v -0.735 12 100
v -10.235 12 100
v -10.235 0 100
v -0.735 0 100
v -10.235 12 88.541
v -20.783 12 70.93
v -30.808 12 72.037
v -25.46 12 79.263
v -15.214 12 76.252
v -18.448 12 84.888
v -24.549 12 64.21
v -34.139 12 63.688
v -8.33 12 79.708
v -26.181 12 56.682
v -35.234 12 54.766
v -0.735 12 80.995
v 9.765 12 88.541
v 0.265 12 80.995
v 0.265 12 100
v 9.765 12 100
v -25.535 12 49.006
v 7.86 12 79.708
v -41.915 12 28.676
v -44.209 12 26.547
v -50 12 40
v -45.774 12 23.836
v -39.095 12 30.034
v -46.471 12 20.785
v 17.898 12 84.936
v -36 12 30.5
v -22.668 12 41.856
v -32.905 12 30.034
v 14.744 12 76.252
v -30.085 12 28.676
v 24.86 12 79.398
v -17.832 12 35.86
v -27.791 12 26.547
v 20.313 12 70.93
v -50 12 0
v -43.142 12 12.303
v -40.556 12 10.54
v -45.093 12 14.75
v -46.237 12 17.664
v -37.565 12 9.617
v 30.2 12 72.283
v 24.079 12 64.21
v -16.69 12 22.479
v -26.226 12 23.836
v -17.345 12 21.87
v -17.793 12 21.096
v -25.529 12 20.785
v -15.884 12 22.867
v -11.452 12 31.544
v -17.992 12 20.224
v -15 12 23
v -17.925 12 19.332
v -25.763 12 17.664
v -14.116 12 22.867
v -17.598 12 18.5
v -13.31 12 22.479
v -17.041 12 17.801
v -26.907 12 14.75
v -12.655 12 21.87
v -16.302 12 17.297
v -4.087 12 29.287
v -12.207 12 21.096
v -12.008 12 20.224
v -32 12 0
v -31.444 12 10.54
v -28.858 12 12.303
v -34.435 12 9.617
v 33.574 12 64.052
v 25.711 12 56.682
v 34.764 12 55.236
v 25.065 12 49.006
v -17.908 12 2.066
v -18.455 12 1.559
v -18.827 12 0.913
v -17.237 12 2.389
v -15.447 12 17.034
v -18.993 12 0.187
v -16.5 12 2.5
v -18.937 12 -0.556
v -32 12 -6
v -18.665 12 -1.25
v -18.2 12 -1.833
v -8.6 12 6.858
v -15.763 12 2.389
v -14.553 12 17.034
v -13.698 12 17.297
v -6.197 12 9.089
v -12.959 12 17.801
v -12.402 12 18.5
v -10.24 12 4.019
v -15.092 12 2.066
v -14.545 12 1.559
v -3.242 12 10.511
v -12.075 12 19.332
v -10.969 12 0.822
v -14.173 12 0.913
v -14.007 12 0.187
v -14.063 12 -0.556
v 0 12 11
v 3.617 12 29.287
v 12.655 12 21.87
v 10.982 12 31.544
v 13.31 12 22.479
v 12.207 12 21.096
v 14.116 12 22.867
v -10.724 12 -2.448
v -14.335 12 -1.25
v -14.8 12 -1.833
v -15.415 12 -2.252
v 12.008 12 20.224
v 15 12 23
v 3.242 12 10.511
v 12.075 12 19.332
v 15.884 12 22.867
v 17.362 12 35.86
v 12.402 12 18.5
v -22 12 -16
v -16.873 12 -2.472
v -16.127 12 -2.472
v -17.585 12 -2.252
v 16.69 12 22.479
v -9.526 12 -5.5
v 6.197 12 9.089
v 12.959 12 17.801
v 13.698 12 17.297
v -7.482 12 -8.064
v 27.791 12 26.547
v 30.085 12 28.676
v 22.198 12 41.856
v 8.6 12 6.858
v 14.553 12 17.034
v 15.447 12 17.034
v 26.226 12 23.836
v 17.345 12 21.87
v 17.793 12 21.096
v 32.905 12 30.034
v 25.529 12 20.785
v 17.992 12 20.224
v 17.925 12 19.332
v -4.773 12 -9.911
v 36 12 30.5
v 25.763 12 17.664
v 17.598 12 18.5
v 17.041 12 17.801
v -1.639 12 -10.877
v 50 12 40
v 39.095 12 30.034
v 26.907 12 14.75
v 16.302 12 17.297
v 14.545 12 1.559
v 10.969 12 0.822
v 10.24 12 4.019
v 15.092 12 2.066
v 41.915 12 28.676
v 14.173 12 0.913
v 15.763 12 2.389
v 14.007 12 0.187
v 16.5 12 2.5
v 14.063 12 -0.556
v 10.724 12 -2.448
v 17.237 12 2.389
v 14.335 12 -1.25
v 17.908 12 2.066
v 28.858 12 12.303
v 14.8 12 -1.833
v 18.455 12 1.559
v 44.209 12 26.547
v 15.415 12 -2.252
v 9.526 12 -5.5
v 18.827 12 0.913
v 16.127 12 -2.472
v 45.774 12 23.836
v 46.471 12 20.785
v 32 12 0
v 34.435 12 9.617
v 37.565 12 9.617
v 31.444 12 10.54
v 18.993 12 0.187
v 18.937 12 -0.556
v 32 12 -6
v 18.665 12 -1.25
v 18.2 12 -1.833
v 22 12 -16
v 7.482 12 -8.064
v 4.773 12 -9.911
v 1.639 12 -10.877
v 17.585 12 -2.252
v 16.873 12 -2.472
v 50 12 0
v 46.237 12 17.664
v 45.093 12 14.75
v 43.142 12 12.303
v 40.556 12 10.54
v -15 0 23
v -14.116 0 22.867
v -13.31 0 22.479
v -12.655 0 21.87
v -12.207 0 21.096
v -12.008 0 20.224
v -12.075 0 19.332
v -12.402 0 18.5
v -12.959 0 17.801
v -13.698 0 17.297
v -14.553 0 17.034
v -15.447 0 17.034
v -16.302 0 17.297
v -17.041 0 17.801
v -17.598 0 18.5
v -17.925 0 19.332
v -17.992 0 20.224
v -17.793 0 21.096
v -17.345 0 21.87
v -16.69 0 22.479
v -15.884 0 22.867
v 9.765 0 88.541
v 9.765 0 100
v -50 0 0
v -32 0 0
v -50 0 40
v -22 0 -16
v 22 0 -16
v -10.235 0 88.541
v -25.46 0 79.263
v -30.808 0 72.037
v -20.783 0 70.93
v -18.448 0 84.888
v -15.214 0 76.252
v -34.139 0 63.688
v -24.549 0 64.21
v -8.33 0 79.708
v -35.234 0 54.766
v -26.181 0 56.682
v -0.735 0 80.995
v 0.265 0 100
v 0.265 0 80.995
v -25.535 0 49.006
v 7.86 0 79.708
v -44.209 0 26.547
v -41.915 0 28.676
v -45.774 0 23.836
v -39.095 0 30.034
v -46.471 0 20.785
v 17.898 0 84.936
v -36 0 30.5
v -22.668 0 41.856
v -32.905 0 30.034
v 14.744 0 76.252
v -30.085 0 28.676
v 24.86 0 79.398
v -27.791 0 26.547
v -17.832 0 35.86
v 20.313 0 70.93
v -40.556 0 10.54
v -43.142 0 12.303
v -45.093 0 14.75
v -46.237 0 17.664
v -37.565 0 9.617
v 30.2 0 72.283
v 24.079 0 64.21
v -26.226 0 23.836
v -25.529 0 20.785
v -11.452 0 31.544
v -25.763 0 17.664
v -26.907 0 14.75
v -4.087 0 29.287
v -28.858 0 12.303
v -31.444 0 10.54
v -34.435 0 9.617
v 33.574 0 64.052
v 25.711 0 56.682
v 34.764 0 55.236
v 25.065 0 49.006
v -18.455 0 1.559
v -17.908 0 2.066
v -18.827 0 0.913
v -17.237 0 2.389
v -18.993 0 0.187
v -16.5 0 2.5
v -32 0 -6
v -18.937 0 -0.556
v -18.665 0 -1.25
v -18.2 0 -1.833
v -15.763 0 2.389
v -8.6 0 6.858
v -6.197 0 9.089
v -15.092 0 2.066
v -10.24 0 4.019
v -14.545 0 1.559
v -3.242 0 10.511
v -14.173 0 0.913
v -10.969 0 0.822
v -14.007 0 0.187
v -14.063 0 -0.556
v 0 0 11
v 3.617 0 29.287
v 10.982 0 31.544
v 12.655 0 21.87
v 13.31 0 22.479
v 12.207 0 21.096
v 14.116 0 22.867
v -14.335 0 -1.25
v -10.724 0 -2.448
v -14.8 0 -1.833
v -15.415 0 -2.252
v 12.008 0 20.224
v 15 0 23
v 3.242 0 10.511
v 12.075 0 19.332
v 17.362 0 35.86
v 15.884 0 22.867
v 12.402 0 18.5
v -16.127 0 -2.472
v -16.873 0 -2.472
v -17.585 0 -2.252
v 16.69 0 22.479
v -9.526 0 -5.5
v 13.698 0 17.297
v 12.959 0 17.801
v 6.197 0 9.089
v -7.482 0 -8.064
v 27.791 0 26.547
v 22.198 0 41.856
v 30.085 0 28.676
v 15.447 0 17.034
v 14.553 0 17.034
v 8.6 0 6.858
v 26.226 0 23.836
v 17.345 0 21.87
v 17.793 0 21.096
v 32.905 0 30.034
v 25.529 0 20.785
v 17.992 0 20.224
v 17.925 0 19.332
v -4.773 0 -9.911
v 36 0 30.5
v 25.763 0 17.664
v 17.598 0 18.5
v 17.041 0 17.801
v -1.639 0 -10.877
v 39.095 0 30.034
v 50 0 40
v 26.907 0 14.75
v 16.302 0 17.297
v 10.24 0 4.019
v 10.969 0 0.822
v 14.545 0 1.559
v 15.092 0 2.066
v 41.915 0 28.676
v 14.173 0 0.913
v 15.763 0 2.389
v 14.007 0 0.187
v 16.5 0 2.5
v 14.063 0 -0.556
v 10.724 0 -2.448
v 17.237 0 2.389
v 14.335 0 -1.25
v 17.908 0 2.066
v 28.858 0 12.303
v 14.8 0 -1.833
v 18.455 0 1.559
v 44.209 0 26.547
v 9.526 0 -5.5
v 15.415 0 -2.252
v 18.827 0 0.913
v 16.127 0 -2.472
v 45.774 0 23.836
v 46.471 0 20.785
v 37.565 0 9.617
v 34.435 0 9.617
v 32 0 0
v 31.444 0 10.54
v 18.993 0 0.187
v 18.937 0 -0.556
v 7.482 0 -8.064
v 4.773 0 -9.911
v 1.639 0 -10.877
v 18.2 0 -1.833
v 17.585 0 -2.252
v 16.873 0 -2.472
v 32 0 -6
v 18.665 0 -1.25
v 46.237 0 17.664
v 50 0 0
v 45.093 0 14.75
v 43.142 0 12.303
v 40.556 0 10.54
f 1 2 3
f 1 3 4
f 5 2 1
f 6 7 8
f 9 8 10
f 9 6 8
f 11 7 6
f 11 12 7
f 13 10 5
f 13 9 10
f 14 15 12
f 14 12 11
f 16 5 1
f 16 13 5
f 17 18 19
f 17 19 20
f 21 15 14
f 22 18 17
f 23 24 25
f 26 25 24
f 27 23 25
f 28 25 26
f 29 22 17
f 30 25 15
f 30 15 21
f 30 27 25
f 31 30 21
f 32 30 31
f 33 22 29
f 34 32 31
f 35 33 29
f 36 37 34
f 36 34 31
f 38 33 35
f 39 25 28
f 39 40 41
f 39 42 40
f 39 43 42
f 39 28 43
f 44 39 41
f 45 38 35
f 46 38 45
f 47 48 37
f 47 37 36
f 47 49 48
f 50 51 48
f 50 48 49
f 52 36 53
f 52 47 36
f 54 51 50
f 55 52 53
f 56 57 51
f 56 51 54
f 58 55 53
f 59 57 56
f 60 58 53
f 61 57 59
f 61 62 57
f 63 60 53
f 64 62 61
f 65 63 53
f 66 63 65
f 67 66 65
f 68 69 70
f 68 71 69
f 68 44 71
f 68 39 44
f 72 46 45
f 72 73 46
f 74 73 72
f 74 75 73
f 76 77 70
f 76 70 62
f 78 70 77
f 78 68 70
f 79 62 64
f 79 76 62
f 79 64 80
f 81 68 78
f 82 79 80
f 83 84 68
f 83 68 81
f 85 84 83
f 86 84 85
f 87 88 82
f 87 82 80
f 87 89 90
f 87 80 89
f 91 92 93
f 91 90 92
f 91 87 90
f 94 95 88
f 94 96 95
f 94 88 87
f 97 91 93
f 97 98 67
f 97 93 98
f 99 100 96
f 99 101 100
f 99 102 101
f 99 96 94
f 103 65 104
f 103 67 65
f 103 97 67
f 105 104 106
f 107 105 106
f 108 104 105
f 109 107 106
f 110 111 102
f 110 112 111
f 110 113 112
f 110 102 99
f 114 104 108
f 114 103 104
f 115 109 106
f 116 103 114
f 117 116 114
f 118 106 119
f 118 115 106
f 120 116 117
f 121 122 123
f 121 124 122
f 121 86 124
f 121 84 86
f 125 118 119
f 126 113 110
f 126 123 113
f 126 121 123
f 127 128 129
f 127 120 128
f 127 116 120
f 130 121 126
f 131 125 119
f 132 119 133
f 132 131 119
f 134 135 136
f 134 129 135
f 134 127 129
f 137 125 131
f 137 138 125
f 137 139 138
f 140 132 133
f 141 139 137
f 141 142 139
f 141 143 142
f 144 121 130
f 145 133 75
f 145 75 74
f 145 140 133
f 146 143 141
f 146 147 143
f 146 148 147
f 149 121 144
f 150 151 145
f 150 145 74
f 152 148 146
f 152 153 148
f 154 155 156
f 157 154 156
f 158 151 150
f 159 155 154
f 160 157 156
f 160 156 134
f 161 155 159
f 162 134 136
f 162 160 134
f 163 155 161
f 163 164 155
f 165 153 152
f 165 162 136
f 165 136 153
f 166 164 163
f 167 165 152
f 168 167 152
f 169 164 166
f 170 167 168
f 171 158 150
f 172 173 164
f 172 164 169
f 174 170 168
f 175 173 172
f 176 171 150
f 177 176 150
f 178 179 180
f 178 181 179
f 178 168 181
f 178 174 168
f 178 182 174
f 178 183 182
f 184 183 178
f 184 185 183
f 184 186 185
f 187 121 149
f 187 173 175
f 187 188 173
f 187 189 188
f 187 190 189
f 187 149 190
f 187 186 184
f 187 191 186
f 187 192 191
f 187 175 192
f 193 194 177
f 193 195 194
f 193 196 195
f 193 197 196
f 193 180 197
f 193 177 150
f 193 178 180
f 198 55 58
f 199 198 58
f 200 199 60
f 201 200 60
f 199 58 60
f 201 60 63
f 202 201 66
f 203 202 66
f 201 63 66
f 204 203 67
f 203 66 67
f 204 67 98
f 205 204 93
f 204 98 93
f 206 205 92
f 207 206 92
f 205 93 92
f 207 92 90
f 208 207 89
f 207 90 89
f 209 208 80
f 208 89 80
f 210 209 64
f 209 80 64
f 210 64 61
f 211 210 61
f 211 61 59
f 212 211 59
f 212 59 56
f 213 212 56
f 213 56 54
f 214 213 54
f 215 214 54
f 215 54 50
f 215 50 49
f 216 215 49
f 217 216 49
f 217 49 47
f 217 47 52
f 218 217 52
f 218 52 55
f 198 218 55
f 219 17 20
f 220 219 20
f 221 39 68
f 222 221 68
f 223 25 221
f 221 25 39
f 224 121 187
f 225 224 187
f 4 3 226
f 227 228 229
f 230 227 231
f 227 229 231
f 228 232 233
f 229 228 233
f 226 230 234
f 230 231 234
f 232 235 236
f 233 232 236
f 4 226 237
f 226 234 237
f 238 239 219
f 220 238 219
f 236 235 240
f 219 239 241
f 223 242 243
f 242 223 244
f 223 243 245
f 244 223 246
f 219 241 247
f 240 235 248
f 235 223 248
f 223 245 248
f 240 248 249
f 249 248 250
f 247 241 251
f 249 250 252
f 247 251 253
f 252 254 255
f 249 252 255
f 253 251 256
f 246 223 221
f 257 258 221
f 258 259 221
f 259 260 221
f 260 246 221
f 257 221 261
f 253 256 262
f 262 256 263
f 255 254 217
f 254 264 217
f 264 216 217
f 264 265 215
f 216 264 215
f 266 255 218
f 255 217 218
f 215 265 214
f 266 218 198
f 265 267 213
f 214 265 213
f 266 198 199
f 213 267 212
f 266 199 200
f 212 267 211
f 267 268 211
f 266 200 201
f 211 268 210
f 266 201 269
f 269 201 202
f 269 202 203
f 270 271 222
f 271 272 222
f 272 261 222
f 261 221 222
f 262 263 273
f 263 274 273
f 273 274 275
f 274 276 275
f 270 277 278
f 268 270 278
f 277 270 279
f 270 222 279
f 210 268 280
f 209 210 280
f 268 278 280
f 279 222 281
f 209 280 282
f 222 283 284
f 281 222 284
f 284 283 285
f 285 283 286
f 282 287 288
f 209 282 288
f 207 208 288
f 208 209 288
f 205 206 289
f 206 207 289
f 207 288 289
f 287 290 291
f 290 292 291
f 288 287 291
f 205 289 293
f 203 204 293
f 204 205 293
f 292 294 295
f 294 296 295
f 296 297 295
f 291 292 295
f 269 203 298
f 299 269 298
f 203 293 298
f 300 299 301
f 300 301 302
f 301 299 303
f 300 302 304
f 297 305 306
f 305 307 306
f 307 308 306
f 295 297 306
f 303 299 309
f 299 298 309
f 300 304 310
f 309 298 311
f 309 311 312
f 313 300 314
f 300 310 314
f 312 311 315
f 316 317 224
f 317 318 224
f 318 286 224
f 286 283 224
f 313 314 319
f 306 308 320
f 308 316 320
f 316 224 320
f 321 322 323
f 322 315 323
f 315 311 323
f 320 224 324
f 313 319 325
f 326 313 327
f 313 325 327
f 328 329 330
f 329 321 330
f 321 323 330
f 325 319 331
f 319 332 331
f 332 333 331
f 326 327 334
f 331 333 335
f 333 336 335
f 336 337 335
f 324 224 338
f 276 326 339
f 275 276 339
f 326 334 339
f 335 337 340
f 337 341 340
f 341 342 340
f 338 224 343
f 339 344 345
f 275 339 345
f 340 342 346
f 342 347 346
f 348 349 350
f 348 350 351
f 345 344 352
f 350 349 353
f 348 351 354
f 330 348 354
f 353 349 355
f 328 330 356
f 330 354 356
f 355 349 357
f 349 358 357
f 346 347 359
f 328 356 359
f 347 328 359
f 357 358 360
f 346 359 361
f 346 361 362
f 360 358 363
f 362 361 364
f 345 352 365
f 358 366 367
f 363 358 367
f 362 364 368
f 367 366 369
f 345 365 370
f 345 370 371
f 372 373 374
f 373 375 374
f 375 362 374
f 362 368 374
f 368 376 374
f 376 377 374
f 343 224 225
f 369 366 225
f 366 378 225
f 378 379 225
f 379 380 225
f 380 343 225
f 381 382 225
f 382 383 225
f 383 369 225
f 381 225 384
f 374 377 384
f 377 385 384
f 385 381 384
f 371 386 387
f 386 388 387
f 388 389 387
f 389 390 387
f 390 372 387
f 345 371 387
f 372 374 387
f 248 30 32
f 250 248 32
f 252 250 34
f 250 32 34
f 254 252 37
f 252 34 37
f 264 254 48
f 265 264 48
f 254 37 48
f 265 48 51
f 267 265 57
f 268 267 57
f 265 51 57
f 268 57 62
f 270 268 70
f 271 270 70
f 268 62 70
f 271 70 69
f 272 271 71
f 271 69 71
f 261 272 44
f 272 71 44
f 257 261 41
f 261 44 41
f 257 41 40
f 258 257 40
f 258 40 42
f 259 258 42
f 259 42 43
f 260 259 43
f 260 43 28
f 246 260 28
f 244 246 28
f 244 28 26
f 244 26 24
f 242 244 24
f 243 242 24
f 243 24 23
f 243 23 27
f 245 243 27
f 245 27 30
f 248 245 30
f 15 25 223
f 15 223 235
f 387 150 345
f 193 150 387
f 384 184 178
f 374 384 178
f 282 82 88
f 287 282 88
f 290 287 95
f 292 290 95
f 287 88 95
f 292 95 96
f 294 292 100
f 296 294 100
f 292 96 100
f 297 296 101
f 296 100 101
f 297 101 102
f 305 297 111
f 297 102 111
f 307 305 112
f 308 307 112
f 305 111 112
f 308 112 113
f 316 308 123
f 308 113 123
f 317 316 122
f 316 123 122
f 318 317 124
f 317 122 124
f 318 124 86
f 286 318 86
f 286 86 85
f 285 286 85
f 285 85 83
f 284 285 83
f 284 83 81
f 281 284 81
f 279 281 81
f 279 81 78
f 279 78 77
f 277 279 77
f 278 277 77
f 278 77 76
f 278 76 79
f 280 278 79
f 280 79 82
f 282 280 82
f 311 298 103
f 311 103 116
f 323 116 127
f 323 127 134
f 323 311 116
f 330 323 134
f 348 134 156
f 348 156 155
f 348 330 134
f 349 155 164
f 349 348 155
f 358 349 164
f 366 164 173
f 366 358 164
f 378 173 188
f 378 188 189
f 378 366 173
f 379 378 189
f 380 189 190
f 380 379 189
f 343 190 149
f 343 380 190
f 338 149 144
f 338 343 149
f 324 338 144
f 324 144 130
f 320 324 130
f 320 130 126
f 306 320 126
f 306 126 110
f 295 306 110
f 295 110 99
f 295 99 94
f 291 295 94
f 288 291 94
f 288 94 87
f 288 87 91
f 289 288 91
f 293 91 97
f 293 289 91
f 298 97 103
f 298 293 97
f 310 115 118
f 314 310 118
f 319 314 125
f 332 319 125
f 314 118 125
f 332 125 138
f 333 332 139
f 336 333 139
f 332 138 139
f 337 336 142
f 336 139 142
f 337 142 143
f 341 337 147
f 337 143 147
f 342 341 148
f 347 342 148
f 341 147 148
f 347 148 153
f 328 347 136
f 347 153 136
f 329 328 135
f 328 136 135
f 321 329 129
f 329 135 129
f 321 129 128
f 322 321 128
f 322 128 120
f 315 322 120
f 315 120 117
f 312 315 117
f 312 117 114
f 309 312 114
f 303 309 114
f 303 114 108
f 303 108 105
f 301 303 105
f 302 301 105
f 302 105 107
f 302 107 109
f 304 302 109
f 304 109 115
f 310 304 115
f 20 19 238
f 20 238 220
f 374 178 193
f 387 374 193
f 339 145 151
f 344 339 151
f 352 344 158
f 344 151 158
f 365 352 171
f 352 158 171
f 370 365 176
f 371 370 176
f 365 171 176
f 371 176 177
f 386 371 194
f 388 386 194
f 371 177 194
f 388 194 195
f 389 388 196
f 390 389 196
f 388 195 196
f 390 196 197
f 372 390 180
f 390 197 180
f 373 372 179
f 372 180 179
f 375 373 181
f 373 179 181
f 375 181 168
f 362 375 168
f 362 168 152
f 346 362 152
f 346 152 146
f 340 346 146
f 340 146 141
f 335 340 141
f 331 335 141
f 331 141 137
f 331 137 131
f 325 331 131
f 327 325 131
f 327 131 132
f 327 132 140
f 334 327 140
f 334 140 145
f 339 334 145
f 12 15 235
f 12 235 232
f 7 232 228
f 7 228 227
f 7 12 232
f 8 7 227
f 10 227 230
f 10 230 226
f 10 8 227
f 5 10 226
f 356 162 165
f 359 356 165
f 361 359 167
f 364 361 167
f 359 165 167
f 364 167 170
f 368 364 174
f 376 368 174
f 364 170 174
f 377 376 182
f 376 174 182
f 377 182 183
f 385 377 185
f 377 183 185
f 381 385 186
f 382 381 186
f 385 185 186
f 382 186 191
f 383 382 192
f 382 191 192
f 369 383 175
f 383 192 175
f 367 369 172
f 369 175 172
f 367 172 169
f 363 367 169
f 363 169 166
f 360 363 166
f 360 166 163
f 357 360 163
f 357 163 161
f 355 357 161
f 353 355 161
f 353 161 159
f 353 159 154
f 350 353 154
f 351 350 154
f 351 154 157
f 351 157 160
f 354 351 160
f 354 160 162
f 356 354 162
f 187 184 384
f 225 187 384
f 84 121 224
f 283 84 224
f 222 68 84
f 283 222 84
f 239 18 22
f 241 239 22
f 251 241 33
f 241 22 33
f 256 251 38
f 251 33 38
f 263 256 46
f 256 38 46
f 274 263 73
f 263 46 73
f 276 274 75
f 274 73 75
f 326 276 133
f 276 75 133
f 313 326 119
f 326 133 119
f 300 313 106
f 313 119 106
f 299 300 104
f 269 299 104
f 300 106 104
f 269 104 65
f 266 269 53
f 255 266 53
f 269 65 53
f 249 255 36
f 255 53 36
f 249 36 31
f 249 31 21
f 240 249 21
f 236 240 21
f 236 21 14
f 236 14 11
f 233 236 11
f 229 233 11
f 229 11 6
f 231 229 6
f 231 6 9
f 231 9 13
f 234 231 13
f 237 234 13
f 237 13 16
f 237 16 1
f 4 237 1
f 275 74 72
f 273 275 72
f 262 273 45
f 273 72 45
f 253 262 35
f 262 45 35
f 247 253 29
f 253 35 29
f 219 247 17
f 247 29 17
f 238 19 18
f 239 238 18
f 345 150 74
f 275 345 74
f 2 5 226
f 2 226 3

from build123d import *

# Parameters (mm, degrees)
SKETCH1_W           = 100
SKETCH1_H           = 100
SKETCH1_R           = 11
BOSS_EXTRUDE1_DEPTH = 12
SKETCH9_W           = 100
SKETCH9_H           = 50
BOSS_EXTRUDE3_DEPTH = 12
CUT_EXTRUDE3_REACH  = 114.446
SKETCH4_R           = 10.5
CUT_EXTRUDE4_REACH  = 114.446
CUT_EXTRUDE5_REACH  = 114.446
SKETCH6_R           = 26
CUT_EXTRUDE6_REACH  = 114.446
CUT_EXTRUDE7_REACH  = 114.446
SKETCH11_R          = 2.5
CHAMFER1_SIZE       = 10
CUT_EXTRUDE8_REACH  = 114.446
SKETCH12_R          = 3


with BuildPart() as part:
    # Sketch1 → Boss-Extrude1 (new body)
    with BuildSketch(Plane(origin=(0, 0, 0), x_dir=(1, 0, 0), z_dir=(0, 1, 0))):
        Rectangle(SKETCH1_W, SKETCH1_H)
        with Locations(Location((0, 0, 0), (0, 0, 270))):
            Circle(SKETCH1_R, mode=Mode.SUBTRACT)
    extrude(amount=BOSS_EXTRUDE1_DEPTH)

    # Sketch9 → Boss-Extrude3 (add)
    with BuildSketch(Plane(origin=(0, 12, 0), x_dir=(1, 0, 0), z_dir=(0, 1, 0))):
        with Locations((0, -75)):
            Rectangle(SKETCH9_W, SKETCH9_H)
    extrude(amount=-BOSS_EXTRUDE3_DEPTH)

    # Sketch4 → Cut-Extrude3 (cut, up to next)
    with BuildSketch(Plane(origin=(0, 12, 0), x_dir=(1, 0, 0), z_dir=(0, 1, 0)), mode=Mode.PRIVATE) as cut_extrude3_sk1:
        with Locations(Location((-36, -20, 0), (0, 0, 270))):
            Circle(SKETCH4_R)
    cut_extrude3_tool1 = extrude(cut_extrude3_sk1.sketch, amount=-CUT_EXTRUDE3_REACH, mode=Mode.PRIVATE) & part.part
    # Sketch4 → Cut-Extrude3 (cut, up to next)
    with BuildSketch(Plane(origin=(0, 12, 0), x_dir=(1, 0, 0), z_dir=(0, 1, 0)), mode=Mode.PRIVATE) as cut_extrude3_sk2:
        with Locations(Location((36, -20, 0), (0, 0, 270))):
            Circle(SKETCH4_R)
    cut_extrude3_tool2 = extrude(cut_extrude3_sk2.sketch, amount=-CUT_EXTRUDE3_REACH, mode=Mode.PRIVATE) & part.part
    add(cut_extrude3_tool1.solids().sort_by_distance((-36, 12, 20))[0], mode=Mode.SUBTRACT)
    add(cut_extrude3_tool2.solids().sort_by_distance((36, 12, 20))[0], mode=Mode.SUBTRACT)

    # Sketch5 → Cut-Extrude4 (cut, up to next)
    with BuildSketch(Plane(origin=(0, 12, 0), x_dir=(1, 0, 0), z_dir=(0, 1, 0)), mode=Mode.PRIVATE) as cut_extrude4_sk1:
        Polygon((-50, 0), (-32, 0), (-32, 16), (32, 16), (32, 0), (50, 0), (50, 50), (-50, 50), align=None)
    cut_extrude4_tool1 = extrude(cut_extrude4_sk1.sketch, amount=-CUT_EXTRUDE4_REACH, mode=Mode.PRIVATE) & part.part
    add(cut_extrude4_tool1.solids().sort_by_distance((0, 12, -29.37827))[0], mode=Mode.SUBTRACT)

    # Sketch6 → Cut-Extrude5 (cut, up to next)
    with BuildSketch(Plane(origin=(0, 12, 0), x_dir=(1, 0, 0), z_dir=(0, 1, 0)), mode=Mode.PRIVATE) as cut_extrude5_sk1:
        with Locations(Location((-0.234960822, -55, 0), (0, 0, 270))):
            Circle(SKETCH6_R)
    cut_extrude5_tool1 = extrude(cut_extrude5_sk1.sketch, amount=-CUT_EXTRUDE5_REACH, mode=Mode.PRIVATE) & part.part
    add(cut_extrude5_tool1.solids().sort_by_distance((-0.234961, 12, 55))[0], mode=Mode.SUBTRACT)

    # Sketch10 → Cut-Extrude6 (cut, up to next)
    with BuildSketch(Plane(origin=(0, 12, 0), x_dir=(1, 0, 0), z_dir=(0, 1, 0)), mode=Mode.PRIVATE) as cut_extrude6_sk1:
        with BuildLine():
            Line((-10.234960822, -88.541019662), (-10.234960822, -100))
            Line((-10.234960822, -100), (-50, -100))
            Line((-50, -100), (-50, -40))
            Line((-50, -40), (-35.234177398, -54.765822602))
            ThreePointArc((-35.234177398, -54.765822602), (-28.367208461, -75.822503278), (-10.234960822, -88.541019662))
        make_face()
    cut_extrude6_tool1 = extrude(cut_extrude6_sk1.sketch, amount=-CUT_EXTRUDE6_REACH, mode=Mode.PRIVATE) & part.part
    # Sketch10 → Cut-Extrude6 (cut, up to next)
    with BuildSketch(Plane(origin=(0, 12, 0), x_dir=(1, 0, 0), z_dir=(0, 1, 0)), mode=Mode.PRIVATE) as cut_extrude6_sk2:
        with BuildLine():
            Line((9.765039178, -88.541019662), (9.765039178, -100))
            Line((9.765039178, -100), (50, -100))
            Line((50, -100), (50, -40))
            Line((50, -40), (34.764245164, -55.235754836))
            ThreePointArc((34.764245164, -55.235754836), (27.756864791, -76.010894766), (9.765039178, -88.541019662))
        make_face()
    cut_extrude6_tool2 = extrude(cut_extrude6_sk2.sketch, amount=-CUT_EXTRUDE6_REACH, mode=Mode.PRIVATE) & part.part
    # Sketch10 → Cut-Extrude6 (cut, up to next)
    with BuildSketch(Plane(origin=(0, 12, 0), x_dir=(1, 0, 0), z_dir=(0, 1, 0)), mode=Mode.PRIVATE) as cut_extrude6_sk3:
        with BuildLine():
            Line((-0.734960822, -80.995191863), (-0.734960822, -100))
            Line((-0.734960822, -100), (0.265039178, -100))
            Line((0.265039178, -100), (0.265039178, -80.995191863))
            ThreePointArc((0.265039178, -80.995191863), (-0.234960822, -81), (-0.734960822, -80.995191863))
        make_face()
    cut_extrude6_tool3 = extrude(cut_extrude6_sk3.sketch, amount=-CUT_EXTRUDE6_REACH, mode=Mode.PRIVATE) & part.part
    add(cut_extrude6_tool1.solids().sort_by_distance((-35.978986, 12, 79.410224))[0], mode=Mode.SUBTRACT)
    add(cut_extrude6_tool2.solids().sort_by_distance((35.780347, 12, 79.379296))[0], mode=Mode.SUBTRACT)
    add(cut_extrude6_tool3.solids().sort_by_distance((-0.234961, 12, 90.499199))[0], mode=Mode.SUBTRACT)

    # Sketch11 → Cut-Extrude7 (cut, up to next)
    with BuildSketch(Plane(origin=(0, 12, 0), x_dir=(1, 0, 0), z_dir=(0, 1, 0)), mode=Mode.PRIVATE) as cut_extrude7_sk1:
        with Locations(Location((-16.5, 0, 0), (0, 0, 270))):
            Circle(SKETCH11_R)
    cut_extrude7_tool1 = extrude(cut_extrude7_sk1.sketch, amount=-CUT_EXTRUDE7_REACH, mode=Mode.PRIVATE) & part.part
    # Sketch11 → Cut-Extrude7 (cut, up to next)
    with BuildSketch(Plane(origin=(0, 12, 0), x_dir=(1, 0, 0), z_dir=(0, 1, 0)), mode=Mode.PRIVATE) as cut_extrude7_sk2:
        with Locations(Location((16.5, 0, 0), (0, 0, 270))):
            Circle(SKETCH11_R)
    cut_extrude7_tool2 = extrude(cut_extrude7_sk2.sketch, amount=-CUT_EXTRUDE7_REACH, mode=Mode.PRIVATE) & part.part
    add(cut_extrude7_tool1.solids().sort_by_distance((-16.5, 12, 0))[0], mode=Mode.SUBTRACT)
    add(cut_extrude7_tool2.solids().sort_by_distance((16.5, 12, 0))[0], mode=Mode.SUBTRACT)

    # Chamfer1
    chamfer1_edges = [part.edges().sort_by_distance(p)[0] for p in [
        (32, 6, -16),
        (-32, 6, -16),
    ]]
    chamfer(chamfer1_edges, length=CHAMFER1_SIZE)

    # Sketch12 → Cut-Extrude8 (cut, up to next)
    with BuildSketch(Plane(origin=(0, 12, 0), x_dir=(1, 0, 0), z_dir=(0, 1, 0)), mode=Mode.PRIVATE) as cut_extrude8_sk1:
        with Locations(Location((15, -20, 0), (0, 0, 270))):
            Circle(SKETCH12_R)
    cut_extrude8_tool1 = extrude(cut_extrude8_sk1.sketch, amount=-CUT_EXTRUDE8_REACH, mode=Mode.PRIVATE) & part.part
    # Sketch12 → Cut-Extrude8 (cut, up to next)
    with BuildSketch(Plane(origin=(0, 12, 0), x_dir=(1, 0, 0), z_dir=(0, 1, 0)), mode=Mode.PRIVATE) as cut_extrude8_sk2:
        with Locations(Location((-15, -20, 0), (0, 0, 270))):
            Circle(SKETCH12_R)
    cut_extrude8_tool2 = extrude(cut_extrude8_sk2.sketch, amount=-CUT_EXTRUDE8_REACH, mode=Mode.PRIVATE) & part.part
    add(cut_extrude8_tool1.solids().sort_by_distance((15, 12, 20))[0], mode=Mode.SUBTRACT)
    add(cut_extrude8_tool2.solids().sort_by_distance((-15, 12, 20))[0], mode=Mode.SUBTRACT)


solid = part.part
